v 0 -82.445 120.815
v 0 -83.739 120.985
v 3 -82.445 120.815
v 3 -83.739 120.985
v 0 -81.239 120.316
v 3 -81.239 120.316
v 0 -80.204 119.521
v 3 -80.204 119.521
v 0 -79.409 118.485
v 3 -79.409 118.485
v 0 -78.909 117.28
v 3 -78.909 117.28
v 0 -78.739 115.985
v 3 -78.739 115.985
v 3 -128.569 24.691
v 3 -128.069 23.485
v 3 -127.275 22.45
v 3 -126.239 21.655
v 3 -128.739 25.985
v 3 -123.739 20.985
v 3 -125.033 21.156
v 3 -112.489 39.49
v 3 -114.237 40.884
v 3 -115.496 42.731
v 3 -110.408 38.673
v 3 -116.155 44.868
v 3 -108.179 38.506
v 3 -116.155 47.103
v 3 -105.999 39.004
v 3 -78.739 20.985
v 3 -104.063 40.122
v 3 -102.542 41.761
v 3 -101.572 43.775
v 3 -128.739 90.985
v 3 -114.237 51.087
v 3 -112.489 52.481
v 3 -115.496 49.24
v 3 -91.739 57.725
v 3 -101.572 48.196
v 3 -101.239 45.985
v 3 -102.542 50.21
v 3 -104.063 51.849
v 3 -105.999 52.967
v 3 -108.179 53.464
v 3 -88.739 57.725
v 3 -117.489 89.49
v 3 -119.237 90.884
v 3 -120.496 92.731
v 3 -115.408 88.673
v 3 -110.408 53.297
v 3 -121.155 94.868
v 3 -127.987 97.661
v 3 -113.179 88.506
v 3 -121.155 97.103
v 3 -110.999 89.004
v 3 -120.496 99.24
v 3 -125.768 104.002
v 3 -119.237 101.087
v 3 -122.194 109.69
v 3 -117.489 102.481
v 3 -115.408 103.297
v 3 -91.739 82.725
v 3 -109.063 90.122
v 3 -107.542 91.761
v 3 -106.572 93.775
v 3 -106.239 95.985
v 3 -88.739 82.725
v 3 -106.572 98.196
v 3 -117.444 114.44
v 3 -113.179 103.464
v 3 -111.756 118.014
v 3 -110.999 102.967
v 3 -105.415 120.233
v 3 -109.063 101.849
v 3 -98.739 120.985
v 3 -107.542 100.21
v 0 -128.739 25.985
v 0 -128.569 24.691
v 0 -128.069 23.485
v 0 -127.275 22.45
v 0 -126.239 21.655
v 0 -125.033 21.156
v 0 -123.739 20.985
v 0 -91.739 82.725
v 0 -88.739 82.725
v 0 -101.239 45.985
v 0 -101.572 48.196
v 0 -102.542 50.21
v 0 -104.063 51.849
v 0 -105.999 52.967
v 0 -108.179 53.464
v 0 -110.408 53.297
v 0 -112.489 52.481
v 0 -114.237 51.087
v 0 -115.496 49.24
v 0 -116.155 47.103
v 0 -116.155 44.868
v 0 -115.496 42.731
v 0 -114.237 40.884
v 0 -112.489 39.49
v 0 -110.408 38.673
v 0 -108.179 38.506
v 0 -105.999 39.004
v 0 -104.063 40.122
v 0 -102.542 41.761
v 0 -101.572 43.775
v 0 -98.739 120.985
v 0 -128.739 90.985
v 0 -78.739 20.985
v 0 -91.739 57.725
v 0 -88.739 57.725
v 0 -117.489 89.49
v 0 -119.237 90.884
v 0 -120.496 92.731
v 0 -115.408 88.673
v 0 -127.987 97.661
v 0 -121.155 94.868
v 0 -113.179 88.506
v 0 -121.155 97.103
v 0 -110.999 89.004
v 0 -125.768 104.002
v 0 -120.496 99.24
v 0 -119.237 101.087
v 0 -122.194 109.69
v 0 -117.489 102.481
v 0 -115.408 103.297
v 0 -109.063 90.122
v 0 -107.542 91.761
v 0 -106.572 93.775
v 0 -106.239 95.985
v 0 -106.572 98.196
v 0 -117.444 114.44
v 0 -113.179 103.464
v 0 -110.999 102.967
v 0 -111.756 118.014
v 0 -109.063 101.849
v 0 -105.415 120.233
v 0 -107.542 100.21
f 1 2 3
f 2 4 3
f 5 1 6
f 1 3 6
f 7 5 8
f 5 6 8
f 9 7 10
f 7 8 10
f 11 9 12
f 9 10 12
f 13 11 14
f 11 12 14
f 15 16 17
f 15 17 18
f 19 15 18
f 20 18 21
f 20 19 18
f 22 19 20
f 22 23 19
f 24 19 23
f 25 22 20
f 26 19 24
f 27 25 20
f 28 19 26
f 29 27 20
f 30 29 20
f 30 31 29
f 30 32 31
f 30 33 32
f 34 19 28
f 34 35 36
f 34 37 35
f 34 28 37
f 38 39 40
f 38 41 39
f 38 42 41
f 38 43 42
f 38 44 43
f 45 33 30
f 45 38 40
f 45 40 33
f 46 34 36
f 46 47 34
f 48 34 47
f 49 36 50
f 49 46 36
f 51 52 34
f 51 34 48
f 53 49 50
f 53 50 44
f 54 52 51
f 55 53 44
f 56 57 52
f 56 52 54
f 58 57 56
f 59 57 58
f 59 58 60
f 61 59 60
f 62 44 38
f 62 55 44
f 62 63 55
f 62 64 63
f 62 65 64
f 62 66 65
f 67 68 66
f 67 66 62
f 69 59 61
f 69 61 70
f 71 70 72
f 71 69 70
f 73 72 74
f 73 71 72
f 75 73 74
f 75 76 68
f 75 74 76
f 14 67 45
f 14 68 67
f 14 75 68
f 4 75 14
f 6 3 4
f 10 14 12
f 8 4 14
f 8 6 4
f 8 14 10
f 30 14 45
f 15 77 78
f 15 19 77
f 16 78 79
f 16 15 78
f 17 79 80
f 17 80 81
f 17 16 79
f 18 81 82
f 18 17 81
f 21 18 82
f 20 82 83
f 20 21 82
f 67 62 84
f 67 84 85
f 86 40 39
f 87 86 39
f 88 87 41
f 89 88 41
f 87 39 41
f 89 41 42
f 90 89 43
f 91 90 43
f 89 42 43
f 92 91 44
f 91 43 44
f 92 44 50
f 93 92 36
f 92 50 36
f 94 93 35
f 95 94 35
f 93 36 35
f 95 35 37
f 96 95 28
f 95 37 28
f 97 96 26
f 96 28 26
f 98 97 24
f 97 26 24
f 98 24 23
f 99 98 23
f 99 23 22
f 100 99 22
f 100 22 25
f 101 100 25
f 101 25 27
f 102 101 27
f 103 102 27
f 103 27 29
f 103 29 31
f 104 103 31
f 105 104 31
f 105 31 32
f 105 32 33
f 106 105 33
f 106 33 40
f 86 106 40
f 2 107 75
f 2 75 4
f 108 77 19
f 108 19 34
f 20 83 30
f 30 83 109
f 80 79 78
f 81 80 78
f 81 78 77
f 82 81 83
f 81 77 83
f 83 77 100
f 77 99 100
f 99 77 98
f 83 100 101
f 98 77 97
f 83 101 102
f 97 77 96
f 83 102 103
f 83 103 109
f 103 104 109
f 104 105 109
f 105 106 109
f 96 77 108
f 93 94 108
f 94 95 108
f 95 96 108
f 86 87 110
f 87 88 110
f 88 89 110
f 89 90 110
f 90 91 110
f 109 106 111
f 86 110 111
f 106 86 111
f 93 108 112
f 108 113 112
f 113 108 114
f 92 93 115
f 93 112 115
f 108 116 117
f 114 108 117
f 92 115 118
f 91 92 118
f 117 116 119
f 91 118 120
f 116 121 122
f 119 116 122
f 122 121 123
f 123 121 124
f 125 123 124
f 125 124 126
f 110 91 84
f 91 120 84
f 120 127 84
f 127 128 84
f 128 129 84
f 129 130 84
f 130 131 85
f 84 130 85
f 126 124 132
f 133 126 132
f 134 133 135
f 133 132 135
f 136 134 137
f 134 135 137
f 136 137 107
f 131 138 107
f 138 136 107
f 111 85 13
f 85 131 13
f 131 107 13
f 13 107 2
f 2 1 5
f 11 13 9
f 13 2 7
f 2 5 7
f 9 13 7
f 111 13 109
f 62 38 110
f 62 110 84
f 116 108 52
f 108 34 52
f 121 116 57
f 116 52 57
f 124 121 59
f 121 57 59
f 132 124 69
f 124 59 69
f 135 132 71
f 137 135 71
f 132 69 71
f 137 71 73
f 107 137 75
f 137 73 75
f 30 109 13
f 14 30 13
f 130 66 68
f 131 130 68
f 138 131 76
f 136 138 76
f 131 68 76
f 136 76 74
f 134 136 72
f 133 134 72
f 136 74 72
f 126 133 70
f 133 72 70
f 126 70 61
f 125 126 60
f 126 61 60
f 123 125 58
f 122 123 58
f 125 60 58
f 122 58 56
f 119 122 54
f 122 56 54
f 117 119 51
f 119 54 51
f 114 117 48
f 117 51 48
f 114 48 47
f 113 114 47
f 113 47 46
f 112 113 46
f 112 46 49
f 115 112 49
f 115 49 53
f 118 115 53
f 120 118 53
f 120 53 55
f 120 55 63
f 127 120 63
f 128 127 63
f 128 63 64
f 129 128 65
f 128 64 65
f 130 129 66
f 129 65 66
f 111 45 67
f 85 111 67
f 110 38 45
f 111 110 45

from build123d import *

# Parameters (mm, degrees)
F0_W      = 50
F0_H      = 100
F1_DEPTH  = 3
F2_W      = 3
F2_H      = 25
F3_DEPTH  = 3
F4_R      = 30
F5_R      = 5
F6_R      = 5
F7_R      = 7.5
F8_DEPTH  = 3
F9_R      = 7.5
F10_DEPTH = 25


with BuildPart() as f1:
    # F0 (on Right) → F1 (new body)
    with BuildSketch(Plane.YZ):
        with Locations((-103.739034, 70.985424)):
            Rectangle(F0_W, F0_H)
    extrude(amount=F1_DEPTH)

    # F2 (on face) → F3 (cut)
    with BuildSketch(Plane.YZ.offset(3)):
        with Locations((-90.239034, 70.224934)):
            Rectangle(F2_W, F2_H)
    extrude(amount=-F3_DEPTH, mode=Mode.SUBTRACT)

    # F4
    f4_edges = [f1.edges().sort_by_distance(p)[0] for p in [
        (1.5, -128.739034, 120.985424),
    ]]
    fillet(f4_edges, radius=F4_R)

    # F5
    f5_edges = [f1.edges().sort_by_distance(p)[0] for p in [
        (1.5, -78.739034, 120.985424),
    ]]
    fillet(f5_edges, radius=F5_R)

    # F6
    f6_edges = [f1.edges().sort_by_distance(p)[0] for p in [
        (1.5, -128.739034, 20.985424),
    ]]
    fillet(f6_edges, radius=F6_R)

    # F7 (on face) → F8 (cut)
    with BuildSketch(Plane.YZ.offset(3)):
        with Locations((-113.739034, 95.985424)):
            Circle(F7_R)
    extrude(amount=-F8_DEPTH, mode=Mode.SUBTRACT)

    # F9 (on face) → F10 (cut)
    with BuildSketch(Plane.YZ.offset(3)):
        with Locations((-108.739034, 45.985424)):
            Circle(F9_R)
    extrude(amount=-F10_DEPTH, mode=Mode.SUBTRACT)


solid = f1.part
